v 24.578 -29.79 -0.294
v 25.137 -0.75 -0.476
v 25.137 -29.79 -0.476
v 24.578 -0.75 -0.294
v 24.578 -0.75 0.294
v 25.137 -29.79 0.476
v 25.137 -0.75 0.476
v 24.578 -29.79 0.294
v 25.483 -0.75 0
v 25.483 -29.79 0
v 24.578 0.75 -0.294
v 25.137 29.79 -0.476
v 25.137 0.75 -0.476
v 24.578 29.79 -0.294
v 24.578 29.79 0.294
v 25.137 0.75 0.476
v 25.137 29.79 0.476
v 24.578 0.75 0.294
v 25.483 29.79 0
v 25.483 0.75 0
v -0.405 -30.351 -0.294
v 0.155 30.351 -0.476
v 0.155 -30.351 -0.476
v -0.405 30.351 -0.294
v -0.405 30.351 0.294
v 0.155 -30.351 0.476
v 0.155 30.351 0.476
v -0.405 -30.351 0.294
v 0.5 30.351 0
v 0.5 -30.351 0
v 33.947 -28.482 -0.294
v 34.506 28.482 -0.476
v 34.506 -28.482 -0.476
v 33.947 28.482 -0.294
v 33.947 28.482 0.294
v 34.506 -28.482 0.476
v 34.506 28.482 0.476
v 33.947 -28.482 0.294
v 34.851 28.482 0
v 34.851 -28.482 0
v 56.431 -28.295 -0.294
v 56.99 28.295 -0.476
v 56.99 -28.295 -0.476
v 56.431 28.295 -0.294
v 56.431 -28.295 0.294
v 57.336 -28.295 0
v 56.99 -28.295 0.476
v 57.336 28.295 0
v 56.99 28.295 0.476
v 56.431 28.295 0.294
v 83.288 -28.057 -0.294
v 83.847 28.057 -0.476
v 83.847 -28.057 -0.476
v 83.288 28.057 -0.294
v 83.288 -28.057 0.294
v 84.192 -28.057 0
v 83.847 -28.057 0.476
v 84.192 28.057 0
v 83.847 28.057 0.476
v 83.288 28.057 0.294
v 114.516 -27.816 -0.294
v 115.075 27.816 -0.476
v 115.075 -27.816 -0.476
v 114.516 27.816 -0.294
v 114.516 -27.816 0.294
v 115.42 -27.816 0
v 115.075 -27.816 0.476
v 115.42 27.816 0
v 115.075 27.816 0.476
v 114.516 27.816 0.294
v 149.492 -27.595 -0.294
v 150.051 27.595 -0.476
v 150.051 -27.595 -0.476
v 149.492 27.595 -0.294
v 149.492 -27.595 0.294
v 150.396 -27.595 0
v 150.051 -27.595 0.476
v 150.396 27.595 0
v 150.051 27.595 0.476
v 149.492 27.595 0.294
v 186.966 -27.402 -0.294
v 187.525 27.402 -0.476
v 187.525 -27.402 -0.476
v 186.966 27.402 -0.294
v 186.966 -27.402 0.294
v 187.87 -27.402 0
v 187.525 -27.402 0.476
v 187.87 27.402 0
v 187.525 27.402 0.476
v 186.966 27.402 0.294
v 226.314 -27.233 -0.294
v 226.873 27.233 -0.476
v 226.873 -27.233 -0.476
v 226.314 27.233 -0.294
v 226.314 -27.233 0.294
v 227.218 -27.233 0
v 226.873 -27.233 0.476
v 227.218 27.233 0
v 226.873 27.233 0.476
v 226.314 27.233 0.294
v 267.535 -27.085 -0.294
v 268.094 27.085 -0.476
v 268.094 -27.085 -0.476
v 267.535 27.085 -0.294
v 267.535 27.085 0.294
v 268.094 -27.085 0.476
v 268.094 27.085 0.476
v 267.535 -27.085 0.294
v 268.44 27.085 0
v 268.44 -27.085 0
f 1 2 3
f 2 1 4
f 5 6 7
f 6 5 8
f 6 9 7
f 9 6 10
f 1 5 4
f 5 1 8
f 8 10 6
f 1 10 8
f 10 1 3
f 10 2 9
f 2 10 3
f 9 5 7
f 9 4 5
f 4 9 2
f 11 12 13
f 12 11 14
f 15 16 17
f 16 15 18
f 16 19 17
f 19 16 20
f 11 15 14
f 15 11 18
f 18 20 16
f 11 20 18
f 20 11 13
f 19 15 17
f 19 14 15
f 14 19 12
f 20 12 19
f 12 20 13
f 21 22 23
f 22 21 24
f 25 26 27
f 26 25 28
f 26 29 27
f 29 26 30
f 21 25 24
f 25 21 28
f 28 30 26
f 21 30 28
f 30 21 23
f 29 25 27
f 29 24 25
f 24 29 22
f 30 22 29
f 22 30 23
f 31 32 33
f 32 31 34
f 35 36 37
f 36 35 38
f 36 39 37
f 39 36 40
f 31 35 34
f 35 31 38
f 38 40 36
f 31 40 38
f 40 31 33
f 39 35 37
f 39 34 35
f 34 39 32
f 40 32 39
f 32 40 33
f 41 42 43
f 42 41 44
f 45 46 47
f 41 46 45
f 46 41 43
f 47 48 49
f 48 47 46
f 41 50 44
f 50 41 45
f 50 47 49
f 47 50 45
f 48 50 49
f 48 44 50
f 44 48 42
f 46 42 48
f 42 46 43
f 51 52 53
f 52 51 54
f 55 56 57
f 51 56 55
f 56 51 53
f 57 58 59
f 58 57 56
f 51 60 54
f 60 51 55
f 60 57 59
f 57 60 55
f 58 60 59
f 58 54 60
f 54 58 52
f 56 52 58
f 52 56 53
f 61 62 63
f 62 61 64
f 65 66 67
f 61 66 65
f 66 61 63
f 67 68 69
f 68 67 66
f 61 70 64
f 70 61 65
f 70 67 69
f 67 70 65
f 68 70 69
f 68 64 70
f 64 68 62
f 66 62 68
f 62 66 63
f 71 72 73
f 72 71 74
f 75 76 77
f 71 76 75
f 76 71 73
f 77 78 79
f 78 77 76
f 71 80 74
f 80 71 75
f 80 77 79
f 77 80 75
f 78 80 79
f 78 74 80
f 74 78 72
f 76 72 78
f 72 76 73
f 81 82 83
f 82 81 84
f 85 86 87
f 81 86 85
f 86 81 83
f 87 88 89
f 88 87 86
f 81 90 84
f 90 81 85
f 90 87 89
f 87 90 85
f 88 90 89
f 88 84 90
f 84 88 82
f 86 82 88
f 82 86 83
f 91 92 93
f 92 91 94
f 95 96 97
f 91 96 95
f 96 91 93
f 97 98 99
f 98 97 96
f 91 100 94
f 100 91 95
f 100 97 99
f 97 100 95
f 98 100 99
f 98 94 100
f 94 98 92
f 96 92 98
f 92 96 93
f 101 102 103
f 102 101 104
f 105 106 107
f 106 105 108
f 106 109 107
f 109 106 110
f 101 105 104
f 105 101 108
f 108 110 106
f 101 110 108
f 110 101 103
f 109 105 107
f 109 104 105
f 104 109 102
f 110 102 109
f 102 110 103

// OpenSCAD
// Implementation of DL6WU's Yagi-Uda algorithm in OpenSCAD
// http://www.ifwtech.co.uk/g3sek/diy-yagi/dl6wu-2006.bas//

C = 299792458; // Speed of light in m/s

// Function to calculate wavelength in meters
function wavelength(frequency) = C / (frequency * 1e6);

// DL6WU spacing table (from BASIC program line 2110-2120)
spacing_table = [
  0.075, // Director 1 spacing from driven element
  0.180, // Director 2 spacing from director 1
  0.215, // Director 3 spacing from director 2
  0.250, // Director 4 spacing from director 3
  0.280, // Director 5 spacing from director 4
  0.300, // Director 6 spacing from director 5
  0.315, // Director 7 spacing from director 6
  0.330, // Director 8 spacing from director 7
  0.345, // Director 9 spacing from director 8
  0.360, // Director 10 spacing from director 9
  0.375, // Director 11 spacing from director 10
  0.390, // Director 12 spacing from director 11
  0.400, // Director 13 spacing from director 12
  0.400, // Director 14+ spacing (constant)
];

// DL6WU director length calculation coefficients (from BASIC program lines 2160-2220)
// Format: [diameter, K1, K2, K3, K4]
director_coeffs = [
  [0.001, 0.4711, 0.018, 0.08398, 0.965],
  [0.003, 0.462, 0.01941, 0.08543, 0.9697],
  [0.005, 0.4538, 0.02117, 0.0951, 1.007],
  [0.007, 0.4491, 0.02274, 0.08801, 0.9004],
  [0.010, 0.4421, 0.02396, 0.1027, 1.038],
  [0.015, 0.4358, 0.02558, 0.1149, 1.034],
  [0.020, 0.4268, 0.02614, 0.1112, 1.036],
];

// Function to get coefficients for specific diameter using array search
function get_director_coeffs(element_diameter) =
  let (
    // Find the closest diameter entries in the array
    diameters = [for (c = director_coeffs) c[0]],
    // Find index of closest lower bound
    lower_idx = max(0, len([for (d = diameters) if (d <= element_diameter / 1000) d]) - 1),
    // Find index of closest upper bound  
    upper_idx = min(len(diameters) - 1, len([for (d = diameters) if (d < element_diameter / 1000) d]))
  ) lower_idx == upper_idx ?
    // Exact match, return those coefficients
    [for (i = [1:4]) director_coeffs[lower_idx][i]]
  : let (
    // Linear interpolation between lower and upper coefficients
    lower = director_coeffs[lower_idx],
    upper = director_coeffs[upper_idx],
    j = (element_diameter - lower[0]) / (upper[0] - lower[0])
  ) [
      lower[1] + j * (upper[1] - lower[1]),
      lower[2] + j * (upper[2] - lower[2]),
      lower[3] + j * (upper[3] - lower[3]),
      lower[4] + j * (upper[4] - lower[4]),
  ];

// Director length calculation (faithful to BASIC line 1490)
function calc_director_length(director_number, element_diameter) =
  let (
    coeffs = get_director_coeffs(element_diameter),
    k1 = coeffs[0],
    k2 = coeffs[1],
    k3 = coeffs[2],
    k4 = coeffs[3]
  ) (k1 - k2 * ln(director_number)) * (1 - k3 * exp(-k4 * director_number));

// Reflector length calculation (faithful to BASIC line 1522)
function calc_reflector_length(element_diameter) =
  let (
    xr = 20, // Reflector reactance (DL6WU recommendation)
    denominator = 186.8769 * ln(2 / element_diameter) - 320
  ) ( ( (xr - 40) / denominator) + 1) / 2;

// Driven element length calculation (faithful to BASIC lines 1530-1540)
function calc_driven_length(element_diameter) =
  let (
    de = (0.4777 - (1.0522 * element_diameter) + (0.43363 * pow(element_diameter, -0.014891))) / 2
  ) 1.02 * de; // 2% longer for better match (DL6WU 1988 modification)

// Calculate cumulative positions along boom (faithful to BASIC lines 1190-1330)
function calc_positions(num_elements) =
  let (
    reflector_pos = 0,
    driven_pos = 0.2, // 0.2λ spacing from reflector (BASIC line 1190)

    // Calculate director positions (BASIC lines 1210-1320)
    director_positions = [
      for (i = [0:num_elements - 3]) driven_pos + sum(
        [
          for (j = [0:i]) (j < len(spacing_table)) ? spacing_table[j] : spacing_table[-1],
        ]
      ),
    ]
  ) concat([reflector_pos, driven_pos], director_positions);

// Helper function to sum array
function sum(arr, i = 0, total = 0) =
  i >= len(arr) ? total : sum(arr, i + 1, total + arr[i]);

// Main Yagi antenna module
module yagi_antenna(
  frequency = 2400, // MHz
  element_diameter = 1, // mm
  num_elements = 10
) {
  lambda = wavelength(frequency);
  lambda_mm = lambda * 1000;
  element_diameter_lambda = element_diameter / lambda_mm;
  half_wave = lambda_mm / 2;

  echo("=== DL6WU YAGI ===");
  echo(str("Frequency: ", frequency, " MHz"));
  echo(str("Wavelength: ", lambda, " m (", lambda_mm, " mm)"));
  echo(str("Element diameter: ", element_diameter, " mm (", element_diameter_lambda, " λ)"));
  echo(str("Number of elements: ", num_elements));

  // Test coefficient lookup
  test_coeffs = get_director_coeffs(element_diameter_lambda);
  echo(str("Interpolated coefficients for ", element_diameter_lambda, " λ: K1=", test_coeffs[0], ", K2=", test_coeffs[1], ", K3=", test_coeffs[2], ", K4=", test_coeffs[3]));

  // Calculate element lengths using DL6WU algorithms
  reflector_length = calc_reflector_length(element_diameter_lambda) * lambda_mm;
  driven_length = calc_driven_length(element_diameter_lambda) * lambda_mm;

  // Calculate director lengths with faithful interpolation
  director_lengths = [
    for (i = [1:num_elements - 2]) calc_director_length(i, element_diameter_lambda) * lambda_mm,
  ];

  // Calculate positions along boom
  positions_lambda = calc_positions(num_elements);
  positions_mm = [for (p = positions_lambda) p * lambda_mm];

  // Combine all element lengths
  element_lengths = concat([reflector_length, driven_length], director_lengths);

  // Calculate boom length
  boom_length = positions_mm[num_elements - 1];

  // Calculate gain using DL6WU formula (BASIC line 610)
  gain_dbd = 9.2 + 3.39 * ln(boom_length / lambda_mm);

  echo("\nELEMENT POSITIONS (from reflector):");
  for (i = [0:num_elements - 1]) {
    element_type = i == 0 ? "Reflector" : i == 1 ? "Driven" : str("Director ", i - 1);
    echo(str(element_type, ": ", positions_mm[i], " mm (", positions_lambda[i], " λ)"));
  }

  echo("\nELEMENT LENGTHS:");
  for (i = [0:num_elements - 1]) {
    element_type = i == 0 ? "Reflector" : i == 1 ? "Driven" : str("Director ", i - 1);
    echo(str(element_type, ": ", element_lengths[i], " mm (", element_lengths[i] / lambda_mm, " λ)"));
  }

  echo("\nPERFORMANCE:");
  echo(str("Boom length: ", boom_length, " mm (", boom_length / lambda_mm, " λ)"));
  echo(str("Estimated gain: ", gain_dbd, " dBd"));

  // Draw elements
  for (i = [0:num_elements - 1]) {
    translate([positions_mm[i], 0, 0]) {
      element_color =
        i == 0 ? "red"
        : // Reflector
        i == 1 ? "blue"
        : // Driven element
        "green"; // Directors

      color(element_color) {
        if (i == 1) {
          // Driven element divided into 2 parts with 1.5*diameter gap
          gap = 1.5 * element_diameter;
          half_length = (element_lengths[i] - gap) / 2;

          // Left half (negative Y direction)
          translate([0, -half_length / 2 - gap / 2, 0])
            rotate([90, 0, 0])
              cylinder(h=half_length, d=element_diameter, center=true);

          // Right half (positive Y direction)  
          translate([0, half_length / 2 + gap / 2, 0])
            rotate([90, 0, 0])
              cylinder(h=half_length, d=element_diameter, center=true);
        } else {
          // Reflector and directors (full elements along Y axis)
          rotate([90, 0, 0])
            cylinder(h=element_lengths[i], d=element_diameter, center=true);
        }
      }
    }
  }
}

yagi_antenna(2400, 1, 10);
